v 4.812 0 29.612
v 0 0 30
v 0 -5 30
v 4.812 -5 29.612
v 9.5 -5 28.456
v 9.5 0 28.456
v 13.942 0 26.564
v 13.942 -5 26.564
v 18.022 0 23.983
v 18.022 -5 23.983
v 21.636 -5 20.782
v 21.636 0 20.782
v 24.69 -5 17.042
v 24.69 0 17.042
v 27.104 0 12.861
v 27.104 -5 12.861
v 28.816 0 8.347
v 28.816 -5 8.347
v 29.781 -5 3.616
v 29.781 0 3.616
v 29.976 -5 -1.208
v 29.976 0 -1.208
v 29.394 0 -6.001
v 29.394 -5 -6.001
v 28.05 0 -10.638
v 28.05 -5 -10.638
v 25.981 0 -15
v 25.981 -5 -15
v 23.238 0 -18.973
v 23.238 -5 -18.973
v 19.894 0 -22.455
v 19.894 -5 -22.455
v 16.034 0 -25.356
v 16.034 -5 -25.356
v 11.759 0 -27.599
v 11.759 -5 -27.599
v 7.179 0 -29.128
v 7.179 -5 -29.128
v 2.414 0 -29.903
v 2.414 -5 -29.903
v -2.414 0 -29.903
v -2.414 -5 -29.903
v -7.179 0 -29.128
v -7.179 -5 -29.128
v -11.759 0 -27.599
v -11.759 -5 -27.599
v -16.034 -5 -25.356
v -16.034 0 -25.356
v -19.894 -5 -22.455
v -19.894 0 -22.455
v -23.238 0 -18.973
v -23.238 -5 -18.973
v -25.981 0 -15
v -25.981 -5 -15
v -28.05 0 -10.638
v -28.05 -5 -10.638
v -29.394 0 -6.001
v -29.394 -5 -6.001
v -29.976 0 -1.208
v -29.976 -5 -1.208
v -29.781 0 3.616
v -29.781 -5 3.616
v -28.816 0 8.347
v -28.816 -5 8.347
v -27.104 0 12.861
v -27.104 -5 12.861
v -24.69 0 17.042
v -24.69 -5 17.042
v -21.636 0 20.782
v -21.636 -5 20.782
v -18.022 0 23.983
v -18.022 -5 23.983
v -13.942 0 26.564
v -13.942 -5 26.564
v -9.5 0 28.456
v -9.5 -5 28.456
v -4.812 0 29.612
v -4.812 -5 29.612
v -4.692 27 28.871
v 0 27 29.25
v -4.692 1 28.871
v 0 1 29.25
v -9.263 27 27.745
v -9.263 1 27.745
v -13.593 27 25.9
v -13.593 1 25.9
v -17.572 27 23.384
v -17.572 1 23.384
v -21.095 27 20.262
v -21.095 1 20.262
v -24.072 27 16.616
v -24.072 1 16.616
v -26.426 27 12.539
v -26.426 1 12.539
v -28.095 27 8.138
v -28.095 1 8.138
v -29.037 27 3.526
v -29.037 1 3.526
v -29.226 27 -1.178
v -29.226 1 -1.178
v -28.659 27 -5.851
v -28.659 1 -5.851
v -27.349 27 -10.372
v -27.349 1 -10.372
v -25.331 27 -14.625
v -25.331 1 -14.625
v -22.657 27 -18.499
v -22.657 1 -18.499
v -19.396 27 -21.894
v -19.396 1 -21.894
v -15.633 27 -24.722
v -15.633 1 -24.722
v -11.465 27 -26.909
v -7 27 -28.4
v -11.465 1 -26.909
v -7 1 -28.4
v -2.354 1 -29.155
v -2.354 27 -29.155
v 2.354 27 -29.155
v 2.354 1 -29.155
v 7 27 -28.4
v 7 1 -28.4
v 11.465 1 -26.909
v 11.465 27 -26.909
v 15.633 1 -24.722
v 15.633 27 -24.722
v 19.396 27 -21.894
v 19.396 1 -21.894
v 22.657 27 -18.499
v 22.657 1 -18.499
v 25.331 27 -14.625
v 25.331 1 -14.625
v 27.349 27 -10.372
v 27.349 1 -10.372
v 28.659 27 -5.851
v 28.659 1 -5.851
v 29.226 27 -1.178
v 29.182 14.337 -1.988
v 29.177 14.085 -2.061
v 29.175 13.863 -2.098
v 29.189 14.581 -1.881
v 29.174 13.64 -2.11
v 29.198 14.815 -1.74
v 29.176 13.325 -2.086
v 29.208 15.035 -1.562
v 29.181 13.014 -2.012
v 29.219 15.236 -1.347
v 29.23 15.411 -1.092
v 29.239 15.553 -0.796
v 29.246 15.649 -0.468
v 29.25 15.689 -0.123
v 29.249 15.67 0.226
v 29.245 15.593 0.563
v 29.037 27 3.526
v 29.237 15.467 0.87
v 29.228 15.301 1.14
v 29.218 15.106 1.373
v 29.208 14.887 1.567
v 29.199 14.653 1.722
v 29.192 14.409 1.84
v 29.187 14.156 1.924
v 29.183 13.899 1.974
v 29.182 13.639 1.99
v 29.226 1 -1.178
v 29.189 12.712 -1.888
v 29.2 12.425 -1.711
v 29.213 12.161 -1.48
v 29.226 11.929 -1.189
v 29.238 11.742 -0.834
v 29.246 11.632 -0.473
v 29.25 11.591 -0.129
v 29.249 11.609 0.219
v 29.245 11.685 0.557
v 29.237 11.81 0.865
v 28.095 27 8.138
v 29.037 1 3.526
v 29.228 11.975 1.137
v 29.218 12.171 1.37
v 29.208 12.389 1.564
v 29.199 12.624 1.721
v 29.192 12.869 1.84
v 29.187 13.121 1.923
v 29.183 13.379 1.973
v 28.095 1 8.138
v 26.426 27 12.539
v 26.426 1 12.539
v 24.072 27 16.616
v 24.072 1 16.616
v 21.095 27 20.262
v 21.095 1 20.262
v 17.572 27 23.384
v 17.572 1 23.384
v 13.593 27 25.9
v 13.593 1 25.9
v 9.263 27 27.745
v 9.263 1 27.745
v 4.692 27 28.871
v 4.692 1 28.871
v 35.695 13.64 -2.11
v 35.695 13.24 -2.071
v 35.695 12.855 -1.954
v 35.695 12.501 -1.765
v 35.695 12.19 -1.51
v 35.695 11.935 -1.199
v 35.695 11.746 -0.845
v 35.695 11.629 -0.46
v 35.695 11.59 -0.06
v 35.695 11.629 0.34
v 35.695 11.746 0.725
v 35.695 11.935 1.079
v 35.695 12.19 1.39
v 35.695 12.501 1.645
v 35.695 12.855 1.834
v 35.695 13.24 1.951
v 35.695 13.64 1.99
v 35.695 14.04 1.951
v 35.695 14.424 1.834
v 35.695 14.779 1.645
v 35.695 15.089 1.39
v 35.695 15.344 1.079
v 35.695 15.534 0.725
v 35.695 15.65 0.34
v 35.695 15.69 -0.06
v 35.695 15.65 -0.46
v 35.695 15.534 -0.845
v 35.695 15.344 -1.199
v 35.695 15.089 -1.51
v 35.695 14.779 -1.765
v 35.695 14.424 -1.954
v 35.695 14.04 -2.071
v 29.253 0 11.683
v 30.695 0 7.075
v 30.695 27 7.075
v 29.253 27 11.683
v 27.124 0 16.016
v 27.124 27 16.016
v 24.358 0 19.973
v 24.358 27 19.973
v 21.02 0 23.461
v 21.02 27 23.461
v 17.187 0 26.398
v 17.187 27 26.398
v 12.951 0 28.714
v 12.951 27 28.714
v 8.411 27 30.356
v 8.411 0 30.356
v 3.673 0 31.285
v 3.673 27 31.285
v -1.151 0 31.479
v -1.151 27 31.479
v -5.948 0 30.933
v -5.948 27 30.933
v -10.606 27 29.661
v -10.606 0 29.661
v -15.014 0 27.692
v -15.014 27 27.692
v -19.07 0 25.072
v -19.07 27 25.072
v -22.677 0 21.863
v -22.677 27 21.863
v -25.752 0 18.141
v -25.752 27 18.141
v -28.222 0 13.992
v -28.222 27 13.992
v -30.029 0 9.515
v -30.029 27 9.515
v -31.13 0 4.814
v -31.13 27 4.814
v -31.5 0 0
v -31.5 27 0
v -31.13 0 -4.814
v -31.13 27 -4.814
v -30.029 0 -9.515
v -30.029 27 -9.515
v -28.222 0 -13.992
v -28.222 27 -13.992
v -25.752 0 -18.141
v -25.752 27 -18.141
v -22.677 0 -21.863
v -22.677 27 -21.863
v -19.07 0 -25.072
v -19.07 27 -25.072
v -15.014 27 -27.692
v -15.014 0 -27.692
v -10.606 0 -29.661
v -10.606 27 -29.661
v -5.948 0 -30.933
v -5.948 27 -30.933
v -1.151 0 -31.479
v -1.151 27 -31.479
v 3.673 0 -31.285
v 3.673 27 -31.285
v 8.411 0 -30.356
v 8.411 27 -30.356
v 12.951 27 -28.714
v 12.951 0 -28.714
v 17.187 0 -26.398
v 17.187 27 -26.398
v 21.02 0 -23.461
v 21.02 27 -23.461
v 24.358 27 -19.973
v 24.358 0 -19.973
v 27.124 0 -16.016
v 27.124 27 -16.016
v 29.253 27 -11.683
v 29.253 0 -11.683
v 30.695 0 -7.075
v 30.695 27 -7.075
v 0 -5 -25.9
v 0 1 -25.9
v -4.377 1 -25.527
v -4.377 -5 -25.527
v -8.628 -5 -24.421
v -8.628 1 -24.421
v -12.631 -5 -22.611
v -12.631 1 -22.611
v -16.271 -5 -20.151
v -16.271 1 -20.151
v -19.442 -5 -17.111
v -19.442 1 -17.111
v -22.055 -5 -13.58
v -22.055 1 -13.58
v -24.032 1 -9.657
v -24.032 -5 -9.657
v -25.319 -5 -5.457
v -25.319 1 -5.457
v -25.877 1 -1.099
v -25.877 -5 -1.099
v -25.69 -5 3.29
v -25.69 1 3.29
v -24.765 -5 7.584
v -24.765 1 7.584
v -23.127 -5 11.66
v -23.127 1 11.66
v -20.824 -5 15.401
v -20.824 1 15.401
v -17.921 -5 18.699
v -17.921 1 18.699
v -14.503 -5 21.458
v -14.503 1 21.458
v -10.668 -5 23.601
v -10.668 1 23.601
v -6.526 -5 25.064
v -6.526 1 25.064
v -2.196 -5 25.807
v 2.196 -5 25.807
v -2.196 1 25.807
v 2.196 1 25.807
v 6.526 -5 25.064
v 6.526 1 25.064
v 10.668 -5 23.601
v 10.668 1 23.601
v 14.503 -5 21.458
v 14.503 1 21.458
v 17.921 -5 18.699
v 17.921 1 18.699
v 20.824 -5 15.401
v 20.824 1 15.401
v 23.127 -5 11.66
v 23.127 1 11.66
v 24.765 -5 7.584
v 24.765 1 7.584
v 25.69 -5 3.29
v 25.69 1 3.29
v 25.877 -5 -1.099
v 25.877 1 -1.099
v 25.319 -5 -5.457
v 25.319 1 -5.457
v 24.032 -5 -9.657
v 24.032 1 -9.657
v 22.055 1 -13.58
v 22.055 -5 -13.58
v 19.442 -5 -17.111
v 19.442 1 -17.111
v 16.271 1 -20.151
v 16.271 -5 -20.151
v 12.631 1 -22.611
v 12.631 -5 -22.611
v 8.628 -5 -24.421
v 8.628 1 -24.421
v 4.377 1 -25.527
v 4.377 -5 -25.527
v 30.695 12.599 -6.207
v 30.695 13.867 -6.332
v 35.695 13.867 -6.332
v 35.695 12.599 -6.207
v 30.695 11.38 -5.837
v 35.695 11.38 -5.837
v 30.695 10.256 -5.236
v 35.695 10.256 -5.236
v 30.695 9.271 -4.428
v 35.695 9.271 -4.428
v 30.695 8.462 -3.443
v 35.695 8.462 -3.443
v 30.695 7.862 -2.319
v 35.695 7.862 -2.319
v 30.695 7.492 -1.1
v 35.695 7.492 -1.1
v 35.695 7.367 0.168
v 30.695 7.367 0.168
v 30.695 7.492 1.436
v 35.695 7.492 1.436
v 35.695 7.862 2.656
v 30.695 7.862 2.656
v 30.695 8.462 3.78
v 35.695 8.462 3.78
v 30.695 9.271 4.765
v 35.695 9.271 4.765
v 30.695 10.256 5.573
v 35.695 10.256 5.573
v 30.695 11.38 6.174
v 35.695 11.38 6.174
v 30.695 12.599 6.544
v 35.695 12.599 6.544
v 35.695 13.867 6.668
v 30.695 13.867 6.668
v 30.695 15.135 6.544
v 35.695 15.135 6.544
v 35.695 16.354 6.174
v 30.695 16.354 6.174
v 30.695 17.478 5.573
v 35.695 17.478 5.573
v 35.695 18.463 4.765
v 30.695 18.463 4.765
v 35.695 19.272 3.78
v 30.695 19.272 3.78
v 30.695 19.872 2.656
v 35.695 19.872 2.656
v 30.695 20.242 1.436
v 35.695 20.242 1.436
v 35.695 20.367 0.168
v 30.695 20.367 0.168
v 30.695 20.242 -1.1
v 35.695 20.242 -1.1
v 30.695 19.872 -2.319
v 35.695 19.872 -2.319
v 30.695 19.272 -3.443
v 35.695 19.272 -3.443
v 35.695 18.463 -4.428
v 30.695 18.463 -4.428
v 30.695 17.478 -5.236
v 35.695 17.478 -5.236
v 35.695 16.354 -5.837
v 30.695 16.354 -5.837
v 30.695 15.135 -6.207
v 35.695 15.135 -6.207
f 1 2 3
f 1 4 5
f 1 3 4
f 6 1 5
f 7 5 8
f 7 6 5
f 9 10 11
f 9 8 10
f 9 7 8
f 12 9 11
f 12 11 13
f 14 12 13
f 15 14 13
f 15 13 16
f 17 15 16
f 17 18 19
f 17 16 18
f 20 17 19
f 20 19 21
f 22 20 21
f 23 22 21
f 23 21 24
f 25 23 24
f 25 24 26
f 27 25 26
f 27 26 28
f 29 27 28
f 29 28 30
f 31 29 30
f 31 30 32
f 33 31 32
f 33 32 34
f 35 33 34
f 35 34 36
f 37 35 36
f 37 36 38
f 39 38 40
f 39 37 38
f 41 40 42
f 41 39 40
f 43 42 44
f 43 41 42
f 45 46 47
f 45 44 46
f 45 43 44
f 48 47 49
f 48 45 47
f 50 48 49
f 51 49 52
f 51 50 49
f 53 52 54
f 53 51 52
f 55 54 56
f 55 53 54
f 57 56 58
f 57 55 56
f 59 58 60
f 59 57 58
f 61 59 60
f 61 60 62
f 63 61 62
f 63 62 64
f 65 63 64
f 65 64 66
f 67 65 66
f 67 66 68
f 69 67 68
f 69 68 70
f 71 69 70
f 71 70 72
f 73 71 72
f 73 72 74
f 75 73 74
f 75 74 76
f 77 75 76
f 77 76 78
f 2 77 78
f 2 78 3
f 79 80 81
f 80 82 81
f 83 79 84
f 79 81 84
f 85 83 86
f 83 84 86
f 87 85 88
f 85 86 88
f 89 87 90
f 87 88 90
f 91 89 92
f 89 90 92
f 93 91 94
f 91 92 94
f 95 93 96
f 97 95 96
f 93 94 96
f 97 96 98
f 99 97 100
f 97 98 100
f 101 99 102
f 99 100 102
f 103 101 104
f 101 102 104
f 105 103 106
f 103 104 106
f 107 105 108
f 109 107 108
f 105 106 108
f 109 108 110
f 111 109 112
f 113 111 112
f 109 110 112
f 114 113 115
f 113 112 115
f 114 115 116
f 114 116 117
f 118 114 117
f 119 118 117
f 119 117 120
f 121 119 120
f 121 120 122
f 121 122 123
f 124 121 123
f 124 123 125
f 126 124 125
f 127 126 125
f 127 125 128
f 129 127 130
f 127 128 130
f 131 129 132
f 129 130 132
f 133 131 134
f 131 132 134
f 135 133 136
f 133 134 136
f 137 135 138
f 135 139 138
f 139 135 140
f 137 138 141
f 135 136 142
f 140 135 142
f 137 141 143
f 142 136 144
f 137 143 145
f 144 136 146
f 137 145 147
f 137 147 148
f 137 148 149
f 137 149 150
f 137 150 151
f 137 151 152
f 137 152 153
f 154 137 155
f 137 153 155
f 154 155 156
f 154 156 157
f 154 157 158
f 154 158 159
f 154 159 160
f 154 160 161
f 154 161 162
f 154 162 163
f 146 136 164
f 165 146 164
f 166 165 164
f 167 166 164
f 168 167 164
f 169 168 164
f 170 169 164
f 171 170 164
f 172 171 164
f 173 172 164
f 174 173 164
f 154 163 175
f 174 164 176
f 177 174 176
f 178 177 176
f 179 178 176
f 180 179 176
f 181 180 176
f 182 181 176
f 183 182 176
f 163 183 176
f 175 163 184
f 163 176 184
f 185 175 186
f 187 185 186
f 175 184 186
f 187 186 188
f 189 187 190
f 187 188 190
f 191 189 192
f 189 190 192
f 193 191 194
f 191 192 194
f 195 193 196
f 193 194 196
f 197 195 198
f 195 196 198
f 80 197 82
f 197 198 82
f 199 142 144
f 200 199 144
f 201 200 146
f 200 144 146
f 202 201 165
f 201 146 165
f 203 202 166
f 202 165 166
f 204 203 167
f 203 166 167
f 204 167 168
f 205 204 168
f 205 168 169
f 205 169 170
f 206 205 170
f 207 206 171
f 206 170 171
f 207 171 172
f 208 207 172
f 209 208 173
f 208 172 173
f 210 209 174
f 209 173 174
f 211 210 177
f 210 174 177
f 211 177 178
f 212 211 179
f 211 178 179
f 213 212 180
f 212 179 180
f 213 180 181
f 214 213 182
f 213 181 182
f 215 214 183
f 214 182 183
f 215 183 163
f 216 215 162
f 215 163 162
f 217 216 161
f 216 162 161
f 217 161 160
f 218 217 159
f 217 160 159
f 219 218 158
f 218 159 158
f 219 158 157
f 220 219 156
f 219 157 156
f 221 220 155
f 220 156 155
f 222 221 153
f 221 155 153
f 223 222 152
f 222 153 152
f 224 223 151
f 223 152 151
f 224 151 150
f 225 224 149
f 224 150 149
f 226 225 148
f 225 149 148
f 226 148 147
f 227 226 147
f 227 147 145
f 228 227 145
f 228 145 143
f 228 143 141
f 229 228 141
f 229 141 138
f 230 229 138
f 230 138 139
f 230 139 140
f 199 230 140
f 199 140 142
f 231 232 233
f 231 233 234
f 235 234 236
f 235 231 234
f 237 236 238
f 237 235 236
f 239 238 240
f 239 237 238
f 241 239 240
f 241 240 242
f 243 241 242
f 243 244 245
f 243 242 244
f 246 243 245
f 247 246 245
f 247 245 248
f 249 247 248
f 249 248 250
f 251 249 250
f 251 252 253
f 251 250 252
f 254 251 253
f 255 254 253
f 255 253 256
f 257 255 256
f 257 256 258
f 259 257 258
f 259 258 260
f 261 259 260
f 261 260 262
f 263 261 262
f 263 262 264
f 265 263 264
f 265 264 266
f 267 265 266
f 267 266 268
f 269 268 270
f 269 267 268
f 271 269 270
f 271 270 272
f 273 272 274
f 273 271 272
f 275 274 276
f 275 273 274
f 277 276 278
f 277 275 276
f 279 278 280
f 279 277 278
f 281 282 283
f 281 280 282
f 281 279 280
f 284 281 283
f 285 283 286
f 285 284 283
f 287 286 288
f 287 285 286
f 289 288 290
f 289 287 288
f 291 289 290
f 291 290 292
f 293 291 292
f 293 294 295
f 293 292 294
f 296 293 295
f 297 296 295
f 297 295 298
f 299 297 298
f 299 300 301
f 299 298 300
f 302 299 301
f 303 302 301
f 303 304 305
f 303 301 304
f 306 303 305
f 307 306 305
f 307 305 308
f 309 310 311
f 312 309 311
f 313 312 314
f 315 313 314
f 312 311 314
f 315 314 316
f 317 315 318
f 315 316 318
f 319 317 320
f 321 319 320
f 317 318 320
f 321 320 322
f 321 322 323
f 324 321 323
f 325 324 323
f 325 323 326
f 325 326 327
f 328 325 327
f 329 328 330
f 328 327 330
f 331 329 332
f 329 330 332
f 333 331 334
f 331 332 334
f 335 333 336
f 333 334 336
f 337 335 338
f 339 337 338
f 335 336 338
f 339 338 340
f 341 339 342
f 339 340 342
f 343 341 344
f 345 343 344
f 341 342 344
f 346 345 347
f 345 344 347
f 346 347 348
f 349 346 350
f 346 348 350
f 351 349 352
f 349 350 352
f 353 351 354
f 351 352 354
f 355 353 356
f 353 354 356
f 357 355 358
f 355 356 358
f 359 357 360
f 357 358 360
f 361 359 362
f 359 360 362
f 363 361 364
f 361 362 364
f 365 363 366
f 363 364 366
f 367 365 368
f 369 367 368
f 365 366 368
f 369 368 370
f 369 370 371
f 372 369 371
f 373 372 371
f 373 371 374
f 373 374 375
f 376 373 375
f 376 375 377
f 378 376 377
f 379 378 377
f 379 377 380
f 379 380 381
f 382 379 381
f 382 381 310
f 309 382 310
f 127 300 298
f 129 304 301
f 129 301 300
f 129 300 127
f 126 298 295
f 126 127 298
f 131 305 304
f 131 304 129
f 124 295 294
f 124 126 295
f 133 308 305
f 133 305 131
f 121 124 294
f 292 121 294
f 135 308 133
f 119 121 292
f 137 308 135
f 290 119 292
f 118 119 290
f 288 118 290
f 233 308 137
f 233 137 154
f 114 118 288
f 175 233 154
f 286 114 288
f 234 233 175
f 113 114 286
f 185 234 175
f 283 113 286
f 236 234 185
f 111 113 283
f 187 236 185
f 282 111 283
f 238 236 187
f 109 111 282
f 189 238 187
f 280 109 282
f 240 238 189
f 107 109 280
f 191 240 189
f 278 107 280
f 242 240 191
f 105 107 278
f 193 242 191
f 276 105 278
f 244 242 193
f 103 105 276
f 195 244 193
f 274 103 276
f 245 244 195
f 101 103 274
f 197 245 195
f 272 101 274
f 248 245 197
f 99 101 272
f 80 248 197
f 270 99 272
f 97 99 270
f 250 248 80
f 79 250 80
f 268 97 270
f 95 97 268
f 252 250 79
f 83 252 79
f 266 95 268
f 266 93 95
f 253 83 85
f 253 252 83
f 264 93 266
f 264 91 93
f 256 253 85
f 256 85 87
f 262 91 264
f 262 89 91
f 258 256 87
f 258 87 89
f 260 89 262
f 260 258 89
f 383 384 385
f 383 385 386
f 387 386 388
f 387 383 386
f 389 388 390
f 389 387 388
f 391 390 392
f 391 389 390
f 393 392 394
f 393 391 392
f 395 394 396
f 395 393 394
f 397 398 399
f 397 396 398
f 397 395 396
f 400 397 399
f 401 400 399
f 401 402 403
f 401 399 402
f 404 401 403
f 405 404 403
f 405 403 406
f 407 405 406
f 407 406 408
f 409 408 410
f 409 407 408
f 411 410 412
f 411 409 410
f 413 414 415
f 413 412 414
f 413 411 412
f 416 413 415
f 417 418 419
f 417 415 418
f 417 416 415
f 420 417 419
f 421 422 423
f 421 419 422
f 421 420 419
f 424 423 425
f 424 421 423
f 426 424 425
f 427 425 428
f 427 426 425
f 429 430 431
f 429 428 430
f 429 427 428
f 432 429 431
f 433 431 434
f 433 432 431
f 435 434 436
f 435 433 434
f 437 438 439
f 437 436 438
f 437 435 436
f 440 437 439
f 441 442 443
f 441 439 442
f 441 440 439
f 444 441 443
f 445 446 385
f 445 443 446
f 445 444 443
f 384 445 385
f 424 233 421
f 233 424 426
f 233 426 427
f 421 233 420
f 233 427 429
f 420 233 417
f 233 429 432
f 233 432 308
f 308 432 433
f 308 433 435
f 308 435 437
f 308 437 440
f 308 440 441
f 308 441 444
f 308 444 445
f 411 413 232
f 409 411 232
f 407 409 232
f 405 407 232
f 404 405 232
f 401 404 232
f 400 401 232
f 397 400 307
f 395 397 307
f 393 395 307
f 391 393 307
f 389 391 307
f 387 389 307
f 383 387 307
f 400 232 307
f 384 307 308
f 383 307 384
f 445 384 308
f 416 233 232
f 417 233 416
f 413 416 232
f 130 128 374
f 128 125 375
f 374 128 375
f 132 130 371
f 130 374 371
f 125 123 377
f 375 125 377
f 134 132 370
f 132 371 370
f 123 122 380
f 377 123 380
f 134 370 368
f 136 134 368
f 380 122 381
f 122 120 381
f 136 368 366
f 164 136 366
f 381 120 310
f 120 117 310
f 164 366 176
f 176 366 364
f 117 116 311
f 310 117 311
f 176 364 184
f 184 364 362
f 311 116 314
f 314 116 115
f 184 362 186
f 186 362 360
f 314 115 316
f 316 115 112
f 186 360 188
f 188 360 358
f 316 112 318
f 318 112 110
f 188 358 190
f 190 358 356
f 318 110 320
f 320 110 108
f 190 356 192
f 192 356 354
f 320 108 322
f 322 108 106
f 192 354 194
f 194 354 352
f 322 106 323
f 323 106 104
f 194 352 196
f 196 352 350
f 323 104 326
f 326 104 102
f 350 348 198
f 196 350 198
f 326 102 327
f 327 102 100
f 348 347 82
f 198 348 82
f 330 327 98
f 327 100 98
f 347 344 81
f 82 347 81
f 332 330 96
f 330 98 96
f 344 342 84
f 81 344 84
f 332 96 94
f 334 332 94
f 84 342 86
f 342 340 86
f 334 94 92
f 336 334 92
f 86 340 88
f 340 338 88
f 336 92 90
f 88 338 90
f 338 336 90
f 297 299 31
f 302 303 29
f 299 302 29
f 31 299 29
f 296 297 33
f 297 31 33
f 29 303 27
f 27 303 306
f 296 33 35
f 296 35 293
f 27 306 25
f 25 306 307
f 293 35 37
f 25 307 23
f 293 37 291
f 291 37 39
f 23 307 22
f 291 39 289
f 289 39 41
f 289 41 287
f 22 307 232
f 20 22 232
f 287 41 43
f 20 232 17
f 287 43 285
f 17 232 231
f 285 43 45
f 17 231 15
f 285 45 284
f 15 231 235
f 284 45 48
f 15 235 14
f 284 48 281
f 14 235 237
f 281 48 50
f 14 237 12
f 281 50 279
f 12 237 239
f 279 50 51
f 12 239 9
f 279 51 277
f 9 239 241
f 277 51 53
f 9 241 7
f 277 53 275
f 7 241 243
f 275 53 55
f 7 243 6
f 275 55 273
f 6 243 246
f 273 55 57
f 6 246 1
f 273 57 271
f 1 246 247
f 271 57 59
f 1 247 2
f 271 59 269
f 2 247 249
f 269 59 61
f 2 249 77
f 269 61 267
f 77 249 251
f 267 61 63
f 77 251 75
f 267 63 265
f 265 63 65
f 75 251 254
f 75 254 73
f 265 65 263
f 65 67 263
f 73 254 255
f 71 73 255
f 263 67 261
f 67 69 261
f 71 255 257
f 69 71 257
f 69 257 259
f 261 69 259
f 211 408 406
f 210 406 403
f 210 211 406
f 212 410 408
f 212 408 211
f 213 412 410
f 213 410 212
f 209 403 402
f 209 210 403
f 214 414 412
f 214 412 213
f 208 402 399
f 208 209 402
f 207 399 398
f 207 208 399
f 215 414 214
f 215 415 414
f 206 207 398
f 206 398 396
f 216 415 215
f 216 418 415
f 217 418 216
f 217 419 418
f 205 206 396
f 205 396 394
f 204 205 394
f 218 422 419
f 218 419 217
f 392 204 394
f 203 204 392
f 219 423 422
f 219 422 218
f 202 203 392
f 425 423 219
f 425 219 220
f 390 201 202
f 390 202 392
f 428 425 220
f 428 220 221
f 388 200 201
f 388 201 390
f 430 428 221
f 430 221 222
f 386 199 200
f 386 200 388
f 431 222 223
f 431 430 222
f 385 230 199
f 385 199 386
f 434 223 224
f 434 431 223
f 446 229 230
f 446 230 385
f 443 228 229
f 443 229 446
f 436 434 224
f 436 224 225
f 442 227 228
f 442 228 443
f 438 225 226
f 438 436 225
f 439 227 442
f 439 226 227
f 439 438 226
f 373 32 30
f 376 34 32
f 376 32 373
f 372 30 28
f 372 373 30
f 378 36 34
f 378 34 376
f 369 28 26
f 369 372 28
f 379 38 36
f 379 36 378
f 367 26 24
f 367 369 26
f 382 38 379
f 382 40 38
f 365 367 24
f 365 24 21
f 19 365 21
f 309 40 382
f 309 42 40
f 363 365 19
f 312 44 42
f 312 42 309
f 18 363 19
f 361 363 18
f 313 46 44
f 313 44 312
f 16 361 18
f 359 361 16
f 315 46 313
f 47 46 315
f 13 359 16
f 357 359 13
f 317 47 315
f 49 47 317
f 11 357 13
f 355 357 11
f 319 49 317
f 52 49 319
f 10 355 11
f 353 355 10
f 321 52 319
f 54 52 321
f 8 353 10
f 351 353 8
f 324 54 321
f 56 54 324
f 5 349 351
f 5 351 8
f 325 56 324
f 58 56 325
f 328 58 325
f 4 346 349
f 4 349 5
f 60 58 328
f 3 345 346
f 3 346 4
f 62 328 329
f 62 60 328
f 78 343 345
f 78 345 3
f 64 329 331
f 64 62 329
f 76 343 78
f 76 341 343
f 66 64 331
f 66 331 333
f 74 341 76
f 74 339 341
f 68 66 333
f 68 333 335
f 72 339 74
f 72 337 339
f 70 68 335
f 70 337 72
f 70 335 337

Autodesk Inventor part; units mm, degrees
ref_plane "YZ Plane" through (0, 0, 0) normal (1, 0, 0) x (0, 1, 0)
ref_plane "XZ Plane" through (0, 0, 0) normal (0, 1, 0) x (-1, 0, 0)
ref_plane "XY Plane" through (0, 0, 0) normal (0, 0, 1) x (1, 0, 0)
sketch "Sketch1" plane through (0, 0, 0) normal (0, 0, 1) x (1, 0, 0)
  point P0 (0, 0)
sketch "Sketch2" plane through (0, 0, 0) normal (0, 1, 0) x (-1, 0, 0)
  arc A0 (-30.6952, -7.0747) -> (-30.6952, 7.0747) centre (0, 0) ccw
  line L0 (-30.6952, 7.0747) -> (-30.6952, -7.0747)
  dimension "d0" = 63
extrude "Extrusion1" add sketch "Sketch2" along normal blind 27
sketch "Sketch3" plane through (0, 27, 0) normal (0, 1, 0) x (0, 0, 1)
  point P0 (0, 0)
  point P1 (0, 0)
hole "Hole1" at (0, 27, 0) direction (0, -1, 0) diameter 58.5 depth 26
sketch "Sketch4" plane through (0, 0, 0) normal (0, -1, 0) x (0, 0, 1)
  circle A0 centre (0, 0) radius 30
  dimension "d11" = 60
extrude "Extrusion2" add sketch "Sketch4" along normal blind 5
sketch "Sketch5" plane through (0, -5, 0) normal (0, -1, 0) x (1, 0, 0)
  point P0 (0, 0)
  point P1 (0, 0)
hole "Hole2" at (0, -5, 0) direction (0, 1, 0) diameter 51.8 depth 11
sketch "Sketch6" plane through (30.6952, 0, 7.0747) normal (1, 0, 0) x (0, 0, -1)
  circle A0 centre (6.9063, 13.867) radius 6.5
  point P0 (7.0747, 0)
  dimension "d23" = 13
extrude "Extrusion3" add sketch "Sketch6" along normal blind 5
sketch "Sketch7" plane through (35.6952, 13.867, 0.1684) normal (1, 0, 0) x (0, 0, -1)
  point P0 (0.1684, -13.867)
  point P1 (0.2284, -0.2272)
hole "Hole3" at (35.6952, 13.6397, -0.06) direction (-1, 0, 0) diameter 4.1 depth 10
properties part number "microscope_holder"
